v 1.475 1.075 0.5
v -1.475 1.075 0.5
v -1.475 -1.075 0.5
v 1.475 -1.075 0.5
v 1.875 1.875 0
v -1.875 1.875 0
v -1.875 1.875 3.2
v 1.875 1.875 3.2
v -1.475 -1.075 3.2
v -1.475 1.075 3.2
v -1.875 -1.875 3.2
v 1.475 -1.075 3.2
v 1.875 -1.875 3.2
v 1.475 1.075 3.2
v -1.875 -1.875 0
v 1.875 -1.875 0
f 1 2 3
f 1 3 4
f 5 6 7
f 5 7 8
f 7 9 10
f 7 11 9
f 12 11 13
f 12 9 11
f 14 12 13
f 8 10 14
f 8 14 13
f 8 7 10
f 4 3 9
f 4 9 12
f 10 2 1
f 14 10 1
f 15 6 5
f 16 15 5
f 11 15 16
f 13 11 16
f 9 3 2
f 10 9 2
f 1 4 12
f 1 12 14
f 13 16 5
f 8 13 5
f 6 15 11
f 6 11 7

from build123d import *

# Parameters (mm, degrees)
F0_W     = 3.75
F0_H     = 3.75
F0_W_2   = 2.95
F0_H_2   = 2.15
F1_DEPTH = 3.2
F2_DEPTH = 0.5


with BuildPart() as f1:
    # F0 (on Top) → F1 (new body)
    with BuildSketch(Plane.XY):
        Rectangle(F0_W, F0_H)
        Rectangle(F0_W_2, F0_H_2, mode=Mode.SUBTRACT)
    extrude(amount=F1_DEPTH)

    # F0 (on Top) → F2 (join)
    with BuildSketch(Plane.XY):
        Rectangle(F0_W_2, F0_H_2)
    extrude(amount=F2_DEPTH)


solid = f1.part
